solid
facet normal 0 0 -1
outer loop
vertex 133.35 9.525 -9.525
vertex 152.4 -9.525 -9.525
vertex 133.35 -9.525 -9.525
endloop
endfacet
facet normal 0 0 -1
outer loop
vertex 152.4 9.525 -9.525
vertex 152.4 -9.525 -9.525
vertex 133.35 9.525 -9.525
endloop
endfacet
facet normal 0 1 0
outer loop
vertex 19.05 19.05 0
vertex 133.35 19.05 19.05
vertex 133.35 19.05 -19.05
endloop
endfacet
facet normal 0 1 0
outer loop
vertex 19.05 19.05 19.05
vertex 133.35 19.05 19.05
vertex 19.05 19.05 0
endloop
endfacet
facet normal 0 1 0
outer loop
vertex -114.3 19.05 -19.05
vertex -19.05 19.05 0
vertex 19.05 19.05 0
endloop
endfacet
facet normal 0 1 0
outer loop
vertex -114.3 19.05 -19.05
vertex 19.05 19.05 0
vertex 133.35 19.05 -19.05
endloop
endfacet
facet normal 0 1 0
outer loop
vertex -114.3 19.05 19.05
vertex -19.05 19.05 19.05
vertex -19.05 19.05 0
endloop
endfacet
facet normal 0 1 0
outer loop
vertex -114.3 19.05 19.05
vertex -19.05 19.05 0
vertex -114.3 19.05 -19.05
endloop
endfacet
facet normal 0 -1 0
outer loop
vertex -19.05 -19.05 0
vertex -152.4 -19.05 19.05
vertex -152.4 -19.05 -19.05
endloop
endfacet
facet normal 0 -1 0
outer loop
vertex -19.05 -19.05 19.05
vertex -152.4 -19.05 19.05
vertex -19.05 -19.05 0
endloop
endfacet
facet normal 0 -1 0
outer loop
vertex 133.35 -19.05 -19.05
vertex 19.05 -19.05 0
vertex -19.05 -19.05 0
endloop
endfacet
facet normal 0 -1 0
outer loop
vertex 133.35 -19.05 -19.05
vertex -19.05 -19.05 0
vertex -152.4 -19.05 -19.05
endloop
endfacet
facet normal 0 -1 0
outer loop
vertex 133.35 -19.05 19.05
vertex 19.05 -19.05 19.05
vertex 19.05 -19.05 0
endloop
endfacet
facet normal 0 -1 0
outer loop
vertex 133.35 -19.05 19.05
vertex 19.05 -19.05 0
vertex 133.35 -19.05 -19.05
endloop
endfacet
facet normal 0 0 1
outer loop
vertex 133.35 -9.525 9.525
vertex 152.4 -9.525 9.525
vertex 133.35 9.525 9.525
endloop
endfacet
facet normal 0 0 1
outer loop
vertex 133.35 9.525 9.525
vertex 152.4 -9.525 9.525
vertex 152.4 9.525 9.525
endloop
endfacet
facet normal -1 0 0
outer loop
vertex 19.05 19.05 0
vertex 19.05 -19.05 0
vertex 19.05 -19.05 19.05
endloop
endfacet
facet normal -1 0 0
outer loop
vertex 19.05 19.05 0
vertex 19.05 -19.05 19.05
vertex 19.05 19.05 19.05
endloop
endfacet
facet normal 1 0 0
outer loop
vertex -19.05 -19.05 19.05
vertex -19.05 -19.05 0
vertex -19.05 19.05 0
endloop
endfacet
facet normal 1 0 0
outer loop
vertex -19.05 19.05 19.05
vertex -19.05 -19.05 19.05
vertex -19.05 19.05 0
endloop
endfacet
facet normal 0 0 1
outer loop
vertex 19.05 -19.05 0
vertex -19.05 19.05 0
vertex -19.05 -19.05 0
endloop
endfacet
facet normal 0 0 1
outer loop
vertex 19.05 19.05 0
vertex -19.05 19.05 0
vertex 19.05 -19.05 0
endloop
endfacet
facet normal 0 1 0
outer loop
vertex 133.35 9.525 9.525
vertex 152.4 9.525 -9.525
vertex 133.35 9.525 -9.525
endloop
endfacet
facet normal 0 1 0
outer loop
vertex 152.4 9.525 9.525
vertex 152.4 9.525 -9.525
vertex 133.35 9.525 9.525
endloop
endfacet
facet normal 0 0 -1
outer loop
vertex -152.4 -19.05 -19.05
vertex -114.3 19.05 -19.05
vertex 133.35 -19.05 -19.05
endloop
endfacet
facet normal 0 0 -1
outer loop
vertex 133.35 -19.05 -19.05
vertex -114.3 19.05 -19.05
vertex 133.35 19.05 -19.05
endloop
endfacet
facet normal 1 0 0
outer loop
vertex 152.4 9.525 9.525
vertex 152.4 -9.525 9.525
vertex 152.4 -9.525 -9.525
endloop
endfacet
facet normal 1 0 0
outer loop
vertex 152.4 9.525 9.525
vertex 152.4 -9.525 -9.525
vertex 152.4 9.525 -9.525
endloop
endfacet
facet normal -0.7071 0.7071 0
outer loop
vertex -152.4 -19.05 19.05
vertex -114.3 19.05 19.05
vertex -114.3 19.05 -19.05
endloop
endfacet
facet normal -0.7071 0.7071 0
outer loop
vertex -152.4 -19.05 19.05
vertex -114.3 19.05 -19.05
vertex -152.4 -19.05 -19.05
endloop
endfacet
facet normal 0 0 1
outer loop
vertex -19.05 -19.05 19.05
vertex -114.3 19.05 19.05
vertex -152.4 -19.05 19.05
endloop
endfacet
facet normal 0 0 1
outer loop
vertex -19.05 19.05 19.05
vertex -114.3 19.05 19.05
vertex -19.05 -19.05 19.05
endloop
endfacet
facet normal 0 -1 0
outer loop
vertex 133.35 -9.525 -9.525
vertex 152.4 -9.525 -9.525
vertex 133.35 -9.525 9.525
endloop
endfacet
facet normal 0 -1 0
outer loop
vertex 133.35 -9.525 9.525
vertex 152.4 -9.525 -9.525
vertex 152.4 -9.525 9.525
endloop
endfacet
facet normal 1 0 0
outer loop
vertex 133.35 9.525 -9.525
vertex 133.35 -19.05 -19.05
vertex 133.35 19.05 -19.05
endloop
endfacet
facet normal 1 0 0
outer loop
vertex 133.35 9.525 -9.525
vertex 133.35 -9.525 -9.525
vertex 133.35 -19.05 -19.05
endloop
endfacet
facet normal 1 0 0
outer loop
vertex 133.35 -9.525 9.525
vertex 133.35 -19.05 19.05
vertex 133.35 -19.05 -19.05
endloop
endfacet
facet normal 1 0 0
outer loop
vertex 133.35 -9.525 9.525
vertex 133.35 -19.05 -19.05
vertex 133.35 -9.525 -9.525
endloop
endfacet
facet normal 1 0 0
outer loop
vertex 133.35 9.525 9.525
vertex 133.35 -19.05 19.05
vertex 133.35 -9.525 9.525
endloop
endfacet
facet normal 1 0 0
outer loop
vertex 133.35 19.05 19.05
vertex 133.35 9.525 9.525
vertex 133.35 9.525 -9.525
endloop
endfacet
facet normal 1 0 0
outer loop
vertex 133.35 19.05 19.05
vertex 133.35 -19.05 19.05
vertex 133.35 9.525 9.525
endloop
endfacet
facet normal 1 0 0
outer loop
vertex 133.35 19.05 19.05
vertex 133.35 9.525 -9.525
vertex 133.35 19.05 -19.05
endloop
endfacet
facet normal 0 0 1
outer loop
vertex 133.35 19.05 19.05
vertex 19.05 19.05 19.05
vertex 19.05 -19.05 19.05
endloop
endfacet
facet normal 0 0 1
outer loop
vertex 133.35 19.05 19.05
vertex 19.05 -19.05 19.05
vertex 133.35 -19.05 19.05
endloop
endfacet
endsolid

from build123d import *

# Parameters (mm, degrees)
F1_DEPTH = 19.05
F2_W     = 38.1
F2_H     = 38.1
F3_DEPTH = 19.05
F4_W     = 38.1
F4_H     = 38.1
F4_W_2   = 19.05
F4_H_2   = 19.05
F5_DEPTH = 19.05


with BuildPart() as f1:
    # F0 (on Top) → F1 (new body, symmetric)
    with BuildSketch(Plane.XY):
        Polygon((152.4, -19.05), (152.4, 19.05), (-114.3, 19.05), (-152.4, -19.05), align=None)
    extrude(amount=F1_DEPTH, both=True)

    # F2 (on Top) → F3 (cut)
    with BuildSketch(Plane.XY):
        Rectangle(F2_W, F2_H)
    extrude(amount=F3_DEPTH, mode=Mode.SUBTRACT)

    # F4 (on face) → F5 (cut)
    with BuildSketch(Plane.YZ.offset(152.4)):
        Rectangle(F4_W, F4_H)
        Rectangle(F4_W_2, F4_H_2, mode=Mode.SUBTRACT)
    extrude(amount=-F5_DEPTH, mode=Mode.SUBTRACT)


solid = f1.part
